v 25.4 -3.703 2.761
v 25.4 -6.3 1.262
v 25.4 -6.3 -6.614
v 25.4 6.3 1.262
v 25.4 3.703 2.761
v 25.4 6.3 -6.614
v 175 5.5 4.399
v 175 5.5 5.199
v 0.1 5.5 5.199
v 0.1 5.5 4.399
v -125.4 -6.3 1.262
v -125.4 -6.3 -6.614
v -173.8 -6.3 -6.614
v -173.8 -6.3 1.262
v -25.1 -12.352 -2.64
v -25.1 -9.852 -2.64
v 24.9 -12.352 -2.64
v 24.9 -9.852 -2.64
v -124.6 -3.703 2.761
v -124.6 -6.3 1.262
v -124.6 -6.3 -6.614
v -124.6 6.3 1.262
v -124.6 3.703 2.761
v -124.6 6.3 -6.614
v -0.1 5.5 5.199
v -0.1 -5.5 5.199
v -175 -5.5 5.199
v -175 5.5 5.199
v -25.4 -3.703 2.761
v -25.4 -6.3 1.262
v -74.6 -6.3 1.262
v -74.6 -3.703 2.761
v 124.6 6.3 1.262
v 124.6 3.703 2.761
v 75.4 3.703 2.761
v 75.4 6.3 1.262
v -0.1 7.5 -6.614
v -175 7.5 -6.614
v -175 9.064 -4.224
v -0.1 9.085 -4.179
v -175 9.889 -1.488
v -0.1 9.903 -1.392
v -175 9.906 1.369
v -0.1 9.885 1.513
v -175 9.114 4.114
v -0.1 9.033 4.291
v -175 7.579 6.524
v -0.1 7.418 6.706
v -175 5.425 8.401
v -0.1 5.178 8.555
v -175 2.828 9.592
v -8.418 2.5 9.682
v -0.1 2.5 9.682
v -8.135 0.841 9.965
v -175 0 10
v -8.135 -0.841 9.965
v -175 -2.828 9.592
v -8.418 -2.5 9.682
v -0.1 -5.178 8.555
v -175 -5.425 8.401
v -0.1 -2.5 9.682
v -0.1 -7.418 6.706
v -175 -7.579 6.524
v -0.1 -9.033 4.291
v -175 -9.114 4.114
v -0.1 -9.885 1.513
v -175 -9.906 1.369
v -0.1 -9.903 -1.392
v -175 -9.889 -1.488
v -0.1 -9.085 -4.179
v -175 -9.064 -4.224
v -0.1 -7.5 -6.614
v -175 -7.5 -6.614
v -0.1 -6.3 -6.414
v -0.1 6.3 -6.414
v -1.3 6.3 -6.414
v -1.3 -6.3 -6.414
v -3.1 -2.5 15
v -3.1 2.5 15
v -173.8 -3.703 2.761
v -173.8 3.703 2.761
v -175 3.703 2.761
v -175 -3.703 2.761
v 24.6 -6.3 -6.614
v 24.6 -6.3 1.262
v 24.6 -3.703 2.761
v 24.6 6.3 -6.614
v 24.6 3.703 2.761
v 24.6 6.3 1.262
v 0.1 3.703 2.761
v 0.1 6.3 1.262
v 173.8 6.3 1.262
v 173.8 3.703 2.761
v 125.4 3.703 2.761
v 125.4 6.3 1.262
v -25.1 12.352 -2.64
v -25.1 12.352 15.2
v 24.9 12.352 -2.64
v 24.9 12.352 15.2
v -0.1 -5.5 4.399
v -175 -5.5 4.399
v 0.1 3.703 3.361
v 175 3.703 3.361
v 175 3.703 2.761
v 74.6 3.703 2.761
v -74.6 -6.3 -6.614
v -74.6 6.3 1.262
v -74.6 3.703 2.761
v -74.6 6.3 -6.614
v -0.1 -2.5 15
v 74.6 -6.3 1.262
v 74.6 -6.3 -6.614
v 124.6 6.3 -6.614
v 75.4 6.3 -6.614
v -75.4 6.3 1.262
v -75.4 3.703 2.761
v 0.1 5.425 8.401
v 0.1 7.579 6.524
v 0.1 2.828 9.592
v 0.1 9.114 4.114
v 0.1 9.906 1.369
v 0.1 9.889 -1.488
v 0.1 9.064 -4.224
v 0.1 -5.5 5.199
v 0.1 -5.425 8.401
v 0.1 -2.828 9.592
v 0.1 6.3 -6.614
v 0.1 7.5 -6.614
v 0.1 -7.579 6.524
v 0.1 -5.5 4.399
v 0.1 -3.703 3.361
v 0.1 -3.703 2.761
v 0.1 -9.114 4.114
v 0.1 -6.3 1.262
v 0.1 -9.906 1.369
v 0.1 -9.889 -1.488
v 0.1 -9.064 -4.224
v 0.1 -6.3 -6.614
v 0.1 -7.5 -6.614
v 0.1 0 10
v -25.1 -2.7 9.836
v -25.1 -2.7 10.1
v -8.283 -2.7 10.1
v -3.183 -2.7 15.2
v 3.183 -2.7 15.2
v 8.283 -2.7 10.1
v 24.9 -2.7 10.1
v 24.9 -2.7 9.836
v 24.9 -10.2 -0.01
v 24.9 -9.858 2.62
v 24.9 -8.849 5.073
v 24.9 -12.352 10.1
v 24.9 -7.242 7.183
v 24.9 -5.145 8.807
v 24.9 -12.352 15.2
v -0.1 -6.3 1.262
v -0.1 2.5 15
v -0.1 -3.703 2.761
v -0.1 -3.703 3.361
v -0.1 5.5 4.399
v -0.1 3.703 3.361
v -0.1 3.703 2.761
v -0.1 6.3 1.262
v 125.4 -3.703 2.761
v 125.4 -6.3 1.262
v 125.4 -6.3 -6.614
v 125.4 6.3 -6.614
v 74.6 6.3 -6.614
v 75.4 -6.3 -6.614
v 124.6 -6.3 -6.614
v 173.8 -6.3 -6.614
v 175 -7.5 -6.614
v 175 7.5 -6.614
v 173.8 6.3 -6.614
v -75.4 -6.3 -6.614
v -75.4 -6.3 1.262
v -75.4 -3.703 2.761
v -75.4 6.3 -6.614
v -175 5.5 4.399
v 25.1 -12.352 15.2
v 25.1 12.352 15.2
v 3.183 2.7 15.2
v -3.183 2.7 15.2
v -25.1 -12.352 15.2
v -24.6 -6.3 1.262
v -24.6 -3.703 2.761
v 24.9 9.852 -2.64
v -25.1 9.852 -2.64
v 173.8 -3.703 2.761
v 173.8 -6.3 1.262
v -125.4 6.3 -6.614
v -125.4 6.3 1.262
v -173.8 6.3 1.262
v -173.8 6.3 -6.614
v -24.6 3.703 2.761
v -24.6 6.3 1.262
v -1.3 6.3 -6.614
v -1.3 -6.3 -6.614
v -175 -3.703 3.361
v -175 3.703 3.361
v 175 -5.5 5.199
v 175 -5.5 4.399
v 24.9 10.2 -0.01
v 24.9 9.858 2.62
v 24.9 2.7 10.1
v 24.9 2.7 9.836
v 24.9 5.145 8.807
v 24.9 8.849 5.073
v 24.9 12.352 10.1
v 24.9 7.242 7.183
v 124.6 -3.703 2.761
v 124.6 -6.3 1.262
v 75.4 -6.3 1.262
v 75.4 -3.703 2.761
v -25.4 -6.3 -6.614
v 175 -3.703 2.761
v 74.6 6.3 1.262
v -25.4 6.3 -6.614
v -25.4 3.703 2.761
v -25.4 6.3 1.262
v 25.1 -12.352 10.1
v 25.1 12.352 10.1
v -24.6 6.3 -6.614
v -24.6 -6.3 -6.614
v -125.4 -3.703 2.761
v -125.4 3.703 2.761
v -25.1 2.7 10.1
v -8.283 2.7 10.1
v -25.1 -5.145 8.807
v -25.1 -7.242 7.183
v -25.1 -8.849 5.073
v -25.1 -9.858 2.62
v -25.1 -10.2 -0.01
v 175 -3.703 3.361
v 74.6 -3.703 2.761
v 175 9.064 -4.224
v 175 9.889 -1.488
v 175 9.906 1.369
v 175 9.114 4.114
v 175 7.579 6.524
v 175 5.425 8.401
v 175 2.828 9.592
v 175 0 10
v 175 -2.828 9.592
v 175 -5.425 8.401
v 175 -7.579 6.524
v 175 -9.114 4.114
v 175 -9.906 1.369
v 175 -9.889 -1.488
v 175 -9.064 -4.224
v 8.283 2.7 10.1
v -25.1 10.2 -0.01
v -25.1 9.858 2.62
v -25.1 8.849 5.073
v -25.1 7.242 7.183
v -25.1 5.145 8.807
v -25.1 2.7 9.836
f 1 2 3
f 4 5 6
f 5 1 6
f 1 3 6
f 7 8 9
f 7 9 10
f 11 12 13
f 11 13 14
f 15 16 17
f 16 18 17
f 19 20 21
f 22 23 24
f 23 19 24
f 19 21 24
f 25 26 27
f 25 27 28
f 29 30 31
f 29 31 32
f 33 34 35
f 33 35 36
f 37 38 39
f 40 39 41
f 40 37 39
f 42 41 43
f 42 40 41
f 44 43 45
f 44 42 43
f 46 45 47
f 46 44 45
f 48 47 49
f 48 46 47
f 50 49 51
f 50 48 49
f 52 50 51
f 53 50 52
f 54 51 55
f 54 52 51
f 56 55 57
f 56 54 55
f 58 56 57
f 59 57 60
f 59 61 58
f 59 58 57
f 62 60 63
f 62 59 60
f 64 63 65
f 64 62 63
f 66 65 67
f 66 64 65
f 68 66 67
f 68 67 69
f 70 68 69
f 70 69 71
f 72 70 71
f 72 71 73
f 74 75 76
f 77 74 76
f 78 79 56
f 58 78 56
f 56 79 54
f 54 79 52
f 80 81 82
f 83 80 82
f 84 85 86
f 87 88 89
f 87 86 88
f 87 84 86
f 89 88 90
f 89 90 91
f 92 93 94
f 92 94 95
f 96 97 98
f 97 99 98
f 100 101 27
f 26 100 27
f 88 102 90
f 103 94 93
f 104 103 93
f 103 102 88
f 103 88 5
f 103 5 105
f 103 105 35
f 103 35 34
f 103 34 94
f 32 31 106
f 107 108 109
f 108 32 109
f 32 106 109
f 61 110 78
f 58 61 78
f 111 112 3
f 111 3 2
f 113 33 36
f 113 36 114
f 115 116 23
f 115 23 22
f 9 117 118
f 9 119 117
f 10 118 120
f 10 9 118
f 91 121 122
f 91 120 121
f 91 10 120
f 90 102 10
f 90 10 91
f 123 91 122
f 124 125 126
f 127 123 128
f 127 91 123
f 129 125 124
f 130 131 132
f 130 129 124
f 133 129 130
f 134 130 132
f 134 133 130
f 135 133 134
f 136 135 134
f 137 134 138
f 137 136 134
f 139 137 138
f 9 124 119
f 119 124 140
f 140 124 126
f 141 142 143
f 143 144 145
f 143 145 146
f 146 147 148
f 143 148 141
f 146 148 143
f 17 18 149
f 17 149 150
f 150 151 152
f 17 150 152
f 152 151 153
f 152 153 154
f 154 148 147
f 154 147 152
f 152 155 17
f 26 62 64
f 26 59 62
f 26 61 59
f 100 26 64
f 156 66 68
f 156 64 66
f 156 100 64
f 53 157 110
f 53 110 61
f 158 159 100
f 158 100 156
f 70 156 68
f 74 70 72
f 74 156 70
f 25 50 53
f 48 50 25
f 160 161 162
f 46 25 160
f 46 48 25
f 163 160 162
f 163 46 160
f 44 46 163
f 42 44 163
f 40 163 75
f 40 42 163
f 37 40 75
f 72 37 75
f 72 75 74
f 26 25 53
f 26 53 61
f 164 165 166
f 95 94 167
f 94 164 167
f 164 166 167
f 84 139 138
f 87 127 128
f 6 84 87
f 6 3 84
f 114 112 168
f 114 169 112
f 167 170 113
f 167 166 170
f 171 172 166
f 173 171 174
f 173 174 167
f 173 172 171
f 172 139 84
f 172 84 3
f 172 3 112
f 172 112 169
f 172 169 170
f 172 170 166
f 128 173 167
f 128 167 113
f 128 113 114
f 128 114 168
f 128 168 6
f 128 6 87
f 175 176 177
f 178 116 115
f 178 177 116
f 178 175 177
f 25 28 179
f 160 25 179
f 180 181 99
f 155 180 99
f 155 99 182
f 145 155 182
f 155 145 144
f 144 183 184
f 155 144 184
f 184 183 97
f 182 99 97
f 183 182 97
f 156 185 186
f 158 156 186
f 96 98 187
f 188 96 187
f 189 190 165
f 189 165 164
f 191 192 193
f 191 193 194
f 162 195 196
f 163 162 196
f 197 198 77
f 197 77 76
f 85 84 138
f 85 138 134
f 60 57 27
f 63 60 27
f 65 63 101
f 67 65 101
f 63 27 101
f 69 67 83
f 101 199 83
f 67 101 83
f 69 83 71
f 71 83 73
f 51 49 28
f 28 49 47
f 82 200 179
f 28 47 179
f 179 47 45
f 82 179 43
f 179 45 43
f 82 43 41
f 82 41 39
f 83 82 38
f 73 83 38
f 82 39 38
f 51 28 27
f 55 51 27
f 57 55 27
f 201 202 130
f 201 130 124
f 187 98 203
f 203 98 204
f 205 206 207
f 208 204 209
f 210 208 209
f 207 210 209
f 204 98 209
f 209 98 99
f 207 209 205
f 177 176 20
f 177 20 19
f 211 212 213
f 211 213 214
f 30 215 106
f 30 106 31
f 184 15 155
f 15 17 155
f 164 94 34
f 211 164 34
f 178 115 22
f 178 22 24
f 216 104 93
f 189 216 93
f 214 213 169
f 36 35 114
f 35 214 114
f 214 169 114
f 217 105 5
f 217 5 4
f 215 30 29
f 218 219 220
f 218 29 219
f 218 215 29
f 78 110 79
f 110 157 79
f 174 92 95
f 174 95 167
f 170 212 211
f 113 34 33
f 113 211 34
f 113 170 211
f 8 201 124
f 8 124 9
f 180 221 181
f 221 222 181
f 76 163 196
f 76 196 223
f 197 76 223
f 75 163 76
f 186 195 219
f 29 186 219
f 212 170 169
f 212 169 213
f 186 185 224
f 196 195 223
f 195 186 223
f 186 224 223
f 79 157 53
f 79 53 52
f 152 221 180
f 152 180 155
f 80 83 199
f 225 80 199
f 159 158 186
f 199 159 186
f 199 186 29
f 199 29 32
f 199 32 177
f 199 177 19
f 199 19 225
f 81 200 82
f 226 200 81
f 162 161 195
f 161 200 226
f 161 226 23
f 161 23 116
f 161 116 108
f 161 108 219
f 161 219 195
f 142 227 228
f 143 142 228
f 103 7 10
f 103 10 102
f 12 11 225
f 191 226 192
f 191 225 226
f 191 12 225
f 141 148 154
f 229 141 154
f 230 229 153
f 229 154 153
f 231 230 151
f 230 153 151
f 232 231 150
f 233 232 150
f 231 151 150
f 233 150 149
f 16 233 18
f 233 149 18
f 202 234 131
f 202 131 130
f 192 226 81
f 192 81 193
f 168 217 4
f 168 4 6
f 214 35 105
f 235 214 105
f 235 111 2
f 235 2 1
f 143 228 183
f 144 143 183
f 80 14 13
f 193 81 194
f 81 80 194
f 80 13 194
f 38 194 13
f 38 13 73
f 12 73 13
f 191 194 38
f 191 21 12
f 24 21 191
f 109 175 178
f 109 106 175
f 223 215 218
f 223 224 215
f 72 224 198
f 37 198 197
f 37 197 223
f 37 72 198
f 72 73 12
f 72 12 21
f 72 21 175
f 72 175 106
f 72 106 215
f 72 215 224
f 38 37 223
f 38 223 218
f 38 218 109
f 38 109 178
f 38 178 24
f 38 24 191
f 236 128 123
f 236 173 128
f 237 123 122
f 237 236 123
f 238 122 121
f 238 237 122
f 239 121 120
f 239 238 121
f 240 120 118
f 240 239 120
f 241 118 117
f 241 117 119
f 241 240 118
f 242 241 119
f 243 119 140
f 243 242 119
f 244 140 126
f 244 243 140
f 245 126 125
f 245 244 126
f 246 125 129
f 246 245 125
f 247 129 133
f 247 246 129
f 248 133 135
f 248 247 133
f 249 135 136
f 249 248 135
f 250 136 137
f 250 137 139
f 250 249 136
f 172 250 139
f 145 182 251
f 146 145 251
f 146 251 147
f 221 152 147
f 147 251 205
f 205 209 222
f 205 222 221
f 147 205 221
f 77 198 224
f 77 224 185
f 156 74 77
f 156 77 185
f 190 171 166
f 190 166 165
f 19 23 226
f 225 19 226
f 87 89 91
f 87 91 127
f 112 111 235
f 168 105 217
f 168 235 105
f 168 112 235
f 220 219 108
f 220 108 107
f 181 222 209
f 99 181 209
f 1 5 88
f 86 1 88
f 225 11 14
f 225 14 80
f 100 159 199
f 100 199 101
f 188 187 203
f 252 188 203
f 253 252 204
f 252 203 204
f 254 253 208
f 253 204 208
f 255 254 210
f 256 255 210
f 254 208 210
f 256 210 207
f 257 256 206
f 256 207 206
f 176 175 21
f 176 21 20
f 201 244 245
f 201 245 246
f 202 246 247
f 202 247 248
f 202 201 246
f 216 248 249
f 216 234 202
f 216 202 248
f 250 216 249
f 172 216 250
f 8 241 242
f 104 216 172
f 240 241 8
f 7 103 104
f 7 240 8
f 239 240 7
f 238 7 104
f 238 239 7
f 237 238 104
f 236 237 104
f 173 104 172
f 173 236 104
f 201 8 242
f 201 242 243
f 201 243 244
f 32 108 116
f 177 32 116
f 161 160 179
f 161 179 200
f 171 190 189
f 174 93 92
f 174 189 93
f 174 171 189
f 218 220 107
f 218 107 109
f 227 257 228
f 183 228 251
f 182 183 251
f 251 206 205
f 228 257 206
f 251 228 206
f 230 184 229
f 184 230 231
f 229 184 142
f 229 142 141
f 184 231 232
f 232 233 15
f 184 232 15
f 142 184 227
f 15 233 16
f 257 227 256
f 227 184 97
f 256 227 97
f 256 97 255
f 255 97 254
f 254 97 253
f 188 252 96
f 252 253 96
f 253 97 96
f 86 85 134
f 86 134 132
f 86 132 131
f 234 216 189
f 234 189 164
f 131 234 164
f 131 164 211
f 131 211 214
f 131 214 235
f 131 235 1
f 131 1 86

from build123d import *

# Parameters (mm, degrees)
BAR_DEPTH                = 175
SKETCH13_W               = 1.2
SKETCH13_H               = 15
SKETCH13_W_2             = 0.8
BOSS_EXTRUDE1_DEPTH      = 9.375645
SKETCH14_W               = 0.2
SKETCH14_H               = 16.614378278
CUT_EXTRUDE1_DEPTH       = 11
CUT_EXTRUDE1_DEPTH_BACK  = 11
BOSS_EXTRUDE2_DEPTH      = 2.5
BOSS_EXTRUDE3_DEPTH      = 25
BOSS_EXTRUDE3_2_DEPTH    = 25
BOSS_EXTRUDE4_DEPTH      = 12.352443
BOSS_EXTRUDE4_DEPTH_BACK = 12.352443
SKETCH18_W               = 1.2
SKETCH18_H               = 15
BOSS_EXTRUDE5_DEPTH      = 0.2


with BuildPart() as part:
    # Sketch1 → Bar (new body, symmetric)
    with BuildSketch(Plane(origin=(0, 0, 0), x_dir=(0, 0, -1), z_dir=(1, 0, 0))):
        with BuildLine():
            Line((-5.198979486, 5.5), (-4.398979486, 5.5))
            Line((-4.398979486, 5.5), (-3.361266245, 3.702627944))
            Line((-3.361266245, 3.702627944), (-2.761266245, 3.702627944))
            Line((-2.761266245, 3.702627944), (-1.26167279, 6.3))
            Line((-1.26167279, 6.3), (6.614378278, 6.3))
            Line((6.614378278, 6.3), (6.614378278, 7.5))
            ThreePointArc((6.614378278, 7.5), (-10, 0), (6.614378278, -7.5))
            Line((6.614378278, -7.5), (6.614378278, -6.3))
            Line((6.614378278, -6.3), (-1.26167279, -6.3))
            Line((-1.26167279, -6.3), (-2.761266245, -3.702627944))
            Line((-2.761266245, -3.702627944), (-3.361266245, -3.702627944))
            Line((-3.361266245, -3.702627944), (-4.398979486, -5.5))
            Line((-4.398979486, -5.5), (-5.198979486, -5.5))
            Line((-5.198979486, -5.5), (-5.198979486, 5.5))
        make_face()
    extrude(amount=BAR_DEPTH, both=True)

    # Sketch13 → Boss-Extrude1 (add)
    with BuildSketch(Plane(origin=(0, 0, -6.614378278), x_dir=(-1, 0, 0), z_dir=(0, 0, -1))):
        with Locations((174.4, 0)):
            Rectangle(SKETCH13_W, SKETCH13_H)
        with Locations((125, 0)):
            Rectangle(SKETCH13_W_2, SKETCH13_H)
        with Locations((75, 0)):
            Rectangle(SKETCH13_W_2, SKETCH13_H)
        with Locations((25, 0)):
            Rectangle(SKETCH13_W_2, SKETCH13_H)
        with Locations((-25, 0)):
            Rectangle(SKETCH13_W_2, SKETCH13_H)
        with Locations((-75, 0)):
            Rectangle(SKETCH13_W_2, SKETCH13_H)
        with Locations((-125, 0)):
            Rectangle(SKETCH13_W_2, SKETCH13_H)
        with Locations((-174.4, 0)):
            Rectangle(SKETCH13_W, SKETCH13_H)
    extrude(amount=-BOSS_EXTRUDE1_DEPTH)

    # Sketch14 → Cut-Extrude1 (cut, two sides)
    with BuildSketch(Plane(origin=(0, 0, 0), x_dir=(1, 0, 0), z_dir=(0, 1, 0))) as cut_extrude1_sk:
        with Locations((0, -1.692810861)):
            Rectangle(SKETCH14_W, SKETCH14_H)
    extrude(amount=CUT_EXTRUDE1_DEPTH, mode=Mode.SUBTRACT)
    extrude(cut_extrude1_sk.sketch, amount=-CUT_EXTRUDE1_DEPTH_BACK, mode=Mode.SUBTRACT)

    # Sketch15 → Boss-Extrude2 (add, symmetric)
    with BuildSketch(Plane(origin=(0, 0, 0), x_dir=(1, 0, 0), z_dir=(0, 1, 0))):
        Polygon((-0.1, -8), (-0.1, -15), (-3.1, -15), (-10.1, -8), align=None)
    extrude(amount=BOSS_EXTRUDE2_DEPTH, both=True)

    # Sketch18 → Boss-Extrude5 (add)
    with BuildSketch(Plane(origin=(0, 0, -6.614378278), x_dir=(-1, 0, 0), z_dir=(0, 0, -1))):
        with Locations((0.7, 0)):
            Rectangle(SKETCH18_W, SKETCH18_H)
    extrude(amount=-BOSS_EXTRUDE5_DEPTH)


with BuildPart() as body_2:
    # Sketch16 → Boss-Extrude3 (new body, symmetric)
    with BuildSketch(Plane(origin=(-0.1, 0, 0), x_dir=(0, 0, -1), z_dir=(1, 0, 0))):
        with BuildLine():
            ThreePointArc((-9.836157786, -2.7), (-5.073036373, -8.848971802), (2.63995426, -9.852443428))
            Line((2.63995426, -9.852443428), (2.63995426, -12.352443428))
            Line((2.63995426, -12.352443428), (-15.2, -12.352443428))
            Line((-15.2, -12.352443428), (-15.2, -2.7))
            Line((-15.2, -2.7), (-9.836157786, -2.7))
        make_face()
    extrude(amount=BOSS_EXTRUDE3_DEPTH, both=True)



with BuildPart() as body_3:
    # Sketch16 → Boss-Extrude3 2 (new body, symmetric)
    with BuildSketch(Plane(origin=(-0.1, 0, 0), x_dir=(0, 0, -1), z_dir=(1, 0, 0))):
        with BuildLine():
            Line((-9.836157786, 2.7), (-15.2, 2.7))
            Line((-15.2, 2.7), (-15.2, 12.352443428))
            Line((-15.2, 12.352443428), (2.63995426, 12.352443428))
            Line((2.63995426, 12.352443428), (2.63995426, 9.852443428))
            ThreePointArc((2.63995426, 9.852443428), (-5.073036373, 8.848971802), (-9.836157786, 2.7))
        make_face()
    extrude(amount=BOSS_EXTRUDE3_2_DEPTH, both=True)


with BuildPart() as body_2_1:
    add(body_2.part)

    add(body_3.part)  # Boss-Extrude4 merges body 3
    # Sketch17 → Boss-Extrude4 (add, two sides)
    with BuildSketch(Plane(origin=(0, 0, 0), x_dir=(1, 0, 0), z_dir=(0, 1, 0))) as boss_extrude4_sk:
        Polygon((-25.1, -10.1), (-8.282842712, -10.1), (-3.182842712, -15.2), (-25.1, -15.2), align=None)
        Polygon((8.282842712, -10.1), (25.1, -10.1), (25.1, -15.2), (3.182842712, -15.2), align=None)
    extrude(amount=BOSS_EXTRUDE4_DEPTH)
    extrude(boss_extrude4_sk.sketch, amount=-BOSS_EXTRUDE4_DEPTH_BACK)


solid = Compound([part.part, body_2_1.part])
